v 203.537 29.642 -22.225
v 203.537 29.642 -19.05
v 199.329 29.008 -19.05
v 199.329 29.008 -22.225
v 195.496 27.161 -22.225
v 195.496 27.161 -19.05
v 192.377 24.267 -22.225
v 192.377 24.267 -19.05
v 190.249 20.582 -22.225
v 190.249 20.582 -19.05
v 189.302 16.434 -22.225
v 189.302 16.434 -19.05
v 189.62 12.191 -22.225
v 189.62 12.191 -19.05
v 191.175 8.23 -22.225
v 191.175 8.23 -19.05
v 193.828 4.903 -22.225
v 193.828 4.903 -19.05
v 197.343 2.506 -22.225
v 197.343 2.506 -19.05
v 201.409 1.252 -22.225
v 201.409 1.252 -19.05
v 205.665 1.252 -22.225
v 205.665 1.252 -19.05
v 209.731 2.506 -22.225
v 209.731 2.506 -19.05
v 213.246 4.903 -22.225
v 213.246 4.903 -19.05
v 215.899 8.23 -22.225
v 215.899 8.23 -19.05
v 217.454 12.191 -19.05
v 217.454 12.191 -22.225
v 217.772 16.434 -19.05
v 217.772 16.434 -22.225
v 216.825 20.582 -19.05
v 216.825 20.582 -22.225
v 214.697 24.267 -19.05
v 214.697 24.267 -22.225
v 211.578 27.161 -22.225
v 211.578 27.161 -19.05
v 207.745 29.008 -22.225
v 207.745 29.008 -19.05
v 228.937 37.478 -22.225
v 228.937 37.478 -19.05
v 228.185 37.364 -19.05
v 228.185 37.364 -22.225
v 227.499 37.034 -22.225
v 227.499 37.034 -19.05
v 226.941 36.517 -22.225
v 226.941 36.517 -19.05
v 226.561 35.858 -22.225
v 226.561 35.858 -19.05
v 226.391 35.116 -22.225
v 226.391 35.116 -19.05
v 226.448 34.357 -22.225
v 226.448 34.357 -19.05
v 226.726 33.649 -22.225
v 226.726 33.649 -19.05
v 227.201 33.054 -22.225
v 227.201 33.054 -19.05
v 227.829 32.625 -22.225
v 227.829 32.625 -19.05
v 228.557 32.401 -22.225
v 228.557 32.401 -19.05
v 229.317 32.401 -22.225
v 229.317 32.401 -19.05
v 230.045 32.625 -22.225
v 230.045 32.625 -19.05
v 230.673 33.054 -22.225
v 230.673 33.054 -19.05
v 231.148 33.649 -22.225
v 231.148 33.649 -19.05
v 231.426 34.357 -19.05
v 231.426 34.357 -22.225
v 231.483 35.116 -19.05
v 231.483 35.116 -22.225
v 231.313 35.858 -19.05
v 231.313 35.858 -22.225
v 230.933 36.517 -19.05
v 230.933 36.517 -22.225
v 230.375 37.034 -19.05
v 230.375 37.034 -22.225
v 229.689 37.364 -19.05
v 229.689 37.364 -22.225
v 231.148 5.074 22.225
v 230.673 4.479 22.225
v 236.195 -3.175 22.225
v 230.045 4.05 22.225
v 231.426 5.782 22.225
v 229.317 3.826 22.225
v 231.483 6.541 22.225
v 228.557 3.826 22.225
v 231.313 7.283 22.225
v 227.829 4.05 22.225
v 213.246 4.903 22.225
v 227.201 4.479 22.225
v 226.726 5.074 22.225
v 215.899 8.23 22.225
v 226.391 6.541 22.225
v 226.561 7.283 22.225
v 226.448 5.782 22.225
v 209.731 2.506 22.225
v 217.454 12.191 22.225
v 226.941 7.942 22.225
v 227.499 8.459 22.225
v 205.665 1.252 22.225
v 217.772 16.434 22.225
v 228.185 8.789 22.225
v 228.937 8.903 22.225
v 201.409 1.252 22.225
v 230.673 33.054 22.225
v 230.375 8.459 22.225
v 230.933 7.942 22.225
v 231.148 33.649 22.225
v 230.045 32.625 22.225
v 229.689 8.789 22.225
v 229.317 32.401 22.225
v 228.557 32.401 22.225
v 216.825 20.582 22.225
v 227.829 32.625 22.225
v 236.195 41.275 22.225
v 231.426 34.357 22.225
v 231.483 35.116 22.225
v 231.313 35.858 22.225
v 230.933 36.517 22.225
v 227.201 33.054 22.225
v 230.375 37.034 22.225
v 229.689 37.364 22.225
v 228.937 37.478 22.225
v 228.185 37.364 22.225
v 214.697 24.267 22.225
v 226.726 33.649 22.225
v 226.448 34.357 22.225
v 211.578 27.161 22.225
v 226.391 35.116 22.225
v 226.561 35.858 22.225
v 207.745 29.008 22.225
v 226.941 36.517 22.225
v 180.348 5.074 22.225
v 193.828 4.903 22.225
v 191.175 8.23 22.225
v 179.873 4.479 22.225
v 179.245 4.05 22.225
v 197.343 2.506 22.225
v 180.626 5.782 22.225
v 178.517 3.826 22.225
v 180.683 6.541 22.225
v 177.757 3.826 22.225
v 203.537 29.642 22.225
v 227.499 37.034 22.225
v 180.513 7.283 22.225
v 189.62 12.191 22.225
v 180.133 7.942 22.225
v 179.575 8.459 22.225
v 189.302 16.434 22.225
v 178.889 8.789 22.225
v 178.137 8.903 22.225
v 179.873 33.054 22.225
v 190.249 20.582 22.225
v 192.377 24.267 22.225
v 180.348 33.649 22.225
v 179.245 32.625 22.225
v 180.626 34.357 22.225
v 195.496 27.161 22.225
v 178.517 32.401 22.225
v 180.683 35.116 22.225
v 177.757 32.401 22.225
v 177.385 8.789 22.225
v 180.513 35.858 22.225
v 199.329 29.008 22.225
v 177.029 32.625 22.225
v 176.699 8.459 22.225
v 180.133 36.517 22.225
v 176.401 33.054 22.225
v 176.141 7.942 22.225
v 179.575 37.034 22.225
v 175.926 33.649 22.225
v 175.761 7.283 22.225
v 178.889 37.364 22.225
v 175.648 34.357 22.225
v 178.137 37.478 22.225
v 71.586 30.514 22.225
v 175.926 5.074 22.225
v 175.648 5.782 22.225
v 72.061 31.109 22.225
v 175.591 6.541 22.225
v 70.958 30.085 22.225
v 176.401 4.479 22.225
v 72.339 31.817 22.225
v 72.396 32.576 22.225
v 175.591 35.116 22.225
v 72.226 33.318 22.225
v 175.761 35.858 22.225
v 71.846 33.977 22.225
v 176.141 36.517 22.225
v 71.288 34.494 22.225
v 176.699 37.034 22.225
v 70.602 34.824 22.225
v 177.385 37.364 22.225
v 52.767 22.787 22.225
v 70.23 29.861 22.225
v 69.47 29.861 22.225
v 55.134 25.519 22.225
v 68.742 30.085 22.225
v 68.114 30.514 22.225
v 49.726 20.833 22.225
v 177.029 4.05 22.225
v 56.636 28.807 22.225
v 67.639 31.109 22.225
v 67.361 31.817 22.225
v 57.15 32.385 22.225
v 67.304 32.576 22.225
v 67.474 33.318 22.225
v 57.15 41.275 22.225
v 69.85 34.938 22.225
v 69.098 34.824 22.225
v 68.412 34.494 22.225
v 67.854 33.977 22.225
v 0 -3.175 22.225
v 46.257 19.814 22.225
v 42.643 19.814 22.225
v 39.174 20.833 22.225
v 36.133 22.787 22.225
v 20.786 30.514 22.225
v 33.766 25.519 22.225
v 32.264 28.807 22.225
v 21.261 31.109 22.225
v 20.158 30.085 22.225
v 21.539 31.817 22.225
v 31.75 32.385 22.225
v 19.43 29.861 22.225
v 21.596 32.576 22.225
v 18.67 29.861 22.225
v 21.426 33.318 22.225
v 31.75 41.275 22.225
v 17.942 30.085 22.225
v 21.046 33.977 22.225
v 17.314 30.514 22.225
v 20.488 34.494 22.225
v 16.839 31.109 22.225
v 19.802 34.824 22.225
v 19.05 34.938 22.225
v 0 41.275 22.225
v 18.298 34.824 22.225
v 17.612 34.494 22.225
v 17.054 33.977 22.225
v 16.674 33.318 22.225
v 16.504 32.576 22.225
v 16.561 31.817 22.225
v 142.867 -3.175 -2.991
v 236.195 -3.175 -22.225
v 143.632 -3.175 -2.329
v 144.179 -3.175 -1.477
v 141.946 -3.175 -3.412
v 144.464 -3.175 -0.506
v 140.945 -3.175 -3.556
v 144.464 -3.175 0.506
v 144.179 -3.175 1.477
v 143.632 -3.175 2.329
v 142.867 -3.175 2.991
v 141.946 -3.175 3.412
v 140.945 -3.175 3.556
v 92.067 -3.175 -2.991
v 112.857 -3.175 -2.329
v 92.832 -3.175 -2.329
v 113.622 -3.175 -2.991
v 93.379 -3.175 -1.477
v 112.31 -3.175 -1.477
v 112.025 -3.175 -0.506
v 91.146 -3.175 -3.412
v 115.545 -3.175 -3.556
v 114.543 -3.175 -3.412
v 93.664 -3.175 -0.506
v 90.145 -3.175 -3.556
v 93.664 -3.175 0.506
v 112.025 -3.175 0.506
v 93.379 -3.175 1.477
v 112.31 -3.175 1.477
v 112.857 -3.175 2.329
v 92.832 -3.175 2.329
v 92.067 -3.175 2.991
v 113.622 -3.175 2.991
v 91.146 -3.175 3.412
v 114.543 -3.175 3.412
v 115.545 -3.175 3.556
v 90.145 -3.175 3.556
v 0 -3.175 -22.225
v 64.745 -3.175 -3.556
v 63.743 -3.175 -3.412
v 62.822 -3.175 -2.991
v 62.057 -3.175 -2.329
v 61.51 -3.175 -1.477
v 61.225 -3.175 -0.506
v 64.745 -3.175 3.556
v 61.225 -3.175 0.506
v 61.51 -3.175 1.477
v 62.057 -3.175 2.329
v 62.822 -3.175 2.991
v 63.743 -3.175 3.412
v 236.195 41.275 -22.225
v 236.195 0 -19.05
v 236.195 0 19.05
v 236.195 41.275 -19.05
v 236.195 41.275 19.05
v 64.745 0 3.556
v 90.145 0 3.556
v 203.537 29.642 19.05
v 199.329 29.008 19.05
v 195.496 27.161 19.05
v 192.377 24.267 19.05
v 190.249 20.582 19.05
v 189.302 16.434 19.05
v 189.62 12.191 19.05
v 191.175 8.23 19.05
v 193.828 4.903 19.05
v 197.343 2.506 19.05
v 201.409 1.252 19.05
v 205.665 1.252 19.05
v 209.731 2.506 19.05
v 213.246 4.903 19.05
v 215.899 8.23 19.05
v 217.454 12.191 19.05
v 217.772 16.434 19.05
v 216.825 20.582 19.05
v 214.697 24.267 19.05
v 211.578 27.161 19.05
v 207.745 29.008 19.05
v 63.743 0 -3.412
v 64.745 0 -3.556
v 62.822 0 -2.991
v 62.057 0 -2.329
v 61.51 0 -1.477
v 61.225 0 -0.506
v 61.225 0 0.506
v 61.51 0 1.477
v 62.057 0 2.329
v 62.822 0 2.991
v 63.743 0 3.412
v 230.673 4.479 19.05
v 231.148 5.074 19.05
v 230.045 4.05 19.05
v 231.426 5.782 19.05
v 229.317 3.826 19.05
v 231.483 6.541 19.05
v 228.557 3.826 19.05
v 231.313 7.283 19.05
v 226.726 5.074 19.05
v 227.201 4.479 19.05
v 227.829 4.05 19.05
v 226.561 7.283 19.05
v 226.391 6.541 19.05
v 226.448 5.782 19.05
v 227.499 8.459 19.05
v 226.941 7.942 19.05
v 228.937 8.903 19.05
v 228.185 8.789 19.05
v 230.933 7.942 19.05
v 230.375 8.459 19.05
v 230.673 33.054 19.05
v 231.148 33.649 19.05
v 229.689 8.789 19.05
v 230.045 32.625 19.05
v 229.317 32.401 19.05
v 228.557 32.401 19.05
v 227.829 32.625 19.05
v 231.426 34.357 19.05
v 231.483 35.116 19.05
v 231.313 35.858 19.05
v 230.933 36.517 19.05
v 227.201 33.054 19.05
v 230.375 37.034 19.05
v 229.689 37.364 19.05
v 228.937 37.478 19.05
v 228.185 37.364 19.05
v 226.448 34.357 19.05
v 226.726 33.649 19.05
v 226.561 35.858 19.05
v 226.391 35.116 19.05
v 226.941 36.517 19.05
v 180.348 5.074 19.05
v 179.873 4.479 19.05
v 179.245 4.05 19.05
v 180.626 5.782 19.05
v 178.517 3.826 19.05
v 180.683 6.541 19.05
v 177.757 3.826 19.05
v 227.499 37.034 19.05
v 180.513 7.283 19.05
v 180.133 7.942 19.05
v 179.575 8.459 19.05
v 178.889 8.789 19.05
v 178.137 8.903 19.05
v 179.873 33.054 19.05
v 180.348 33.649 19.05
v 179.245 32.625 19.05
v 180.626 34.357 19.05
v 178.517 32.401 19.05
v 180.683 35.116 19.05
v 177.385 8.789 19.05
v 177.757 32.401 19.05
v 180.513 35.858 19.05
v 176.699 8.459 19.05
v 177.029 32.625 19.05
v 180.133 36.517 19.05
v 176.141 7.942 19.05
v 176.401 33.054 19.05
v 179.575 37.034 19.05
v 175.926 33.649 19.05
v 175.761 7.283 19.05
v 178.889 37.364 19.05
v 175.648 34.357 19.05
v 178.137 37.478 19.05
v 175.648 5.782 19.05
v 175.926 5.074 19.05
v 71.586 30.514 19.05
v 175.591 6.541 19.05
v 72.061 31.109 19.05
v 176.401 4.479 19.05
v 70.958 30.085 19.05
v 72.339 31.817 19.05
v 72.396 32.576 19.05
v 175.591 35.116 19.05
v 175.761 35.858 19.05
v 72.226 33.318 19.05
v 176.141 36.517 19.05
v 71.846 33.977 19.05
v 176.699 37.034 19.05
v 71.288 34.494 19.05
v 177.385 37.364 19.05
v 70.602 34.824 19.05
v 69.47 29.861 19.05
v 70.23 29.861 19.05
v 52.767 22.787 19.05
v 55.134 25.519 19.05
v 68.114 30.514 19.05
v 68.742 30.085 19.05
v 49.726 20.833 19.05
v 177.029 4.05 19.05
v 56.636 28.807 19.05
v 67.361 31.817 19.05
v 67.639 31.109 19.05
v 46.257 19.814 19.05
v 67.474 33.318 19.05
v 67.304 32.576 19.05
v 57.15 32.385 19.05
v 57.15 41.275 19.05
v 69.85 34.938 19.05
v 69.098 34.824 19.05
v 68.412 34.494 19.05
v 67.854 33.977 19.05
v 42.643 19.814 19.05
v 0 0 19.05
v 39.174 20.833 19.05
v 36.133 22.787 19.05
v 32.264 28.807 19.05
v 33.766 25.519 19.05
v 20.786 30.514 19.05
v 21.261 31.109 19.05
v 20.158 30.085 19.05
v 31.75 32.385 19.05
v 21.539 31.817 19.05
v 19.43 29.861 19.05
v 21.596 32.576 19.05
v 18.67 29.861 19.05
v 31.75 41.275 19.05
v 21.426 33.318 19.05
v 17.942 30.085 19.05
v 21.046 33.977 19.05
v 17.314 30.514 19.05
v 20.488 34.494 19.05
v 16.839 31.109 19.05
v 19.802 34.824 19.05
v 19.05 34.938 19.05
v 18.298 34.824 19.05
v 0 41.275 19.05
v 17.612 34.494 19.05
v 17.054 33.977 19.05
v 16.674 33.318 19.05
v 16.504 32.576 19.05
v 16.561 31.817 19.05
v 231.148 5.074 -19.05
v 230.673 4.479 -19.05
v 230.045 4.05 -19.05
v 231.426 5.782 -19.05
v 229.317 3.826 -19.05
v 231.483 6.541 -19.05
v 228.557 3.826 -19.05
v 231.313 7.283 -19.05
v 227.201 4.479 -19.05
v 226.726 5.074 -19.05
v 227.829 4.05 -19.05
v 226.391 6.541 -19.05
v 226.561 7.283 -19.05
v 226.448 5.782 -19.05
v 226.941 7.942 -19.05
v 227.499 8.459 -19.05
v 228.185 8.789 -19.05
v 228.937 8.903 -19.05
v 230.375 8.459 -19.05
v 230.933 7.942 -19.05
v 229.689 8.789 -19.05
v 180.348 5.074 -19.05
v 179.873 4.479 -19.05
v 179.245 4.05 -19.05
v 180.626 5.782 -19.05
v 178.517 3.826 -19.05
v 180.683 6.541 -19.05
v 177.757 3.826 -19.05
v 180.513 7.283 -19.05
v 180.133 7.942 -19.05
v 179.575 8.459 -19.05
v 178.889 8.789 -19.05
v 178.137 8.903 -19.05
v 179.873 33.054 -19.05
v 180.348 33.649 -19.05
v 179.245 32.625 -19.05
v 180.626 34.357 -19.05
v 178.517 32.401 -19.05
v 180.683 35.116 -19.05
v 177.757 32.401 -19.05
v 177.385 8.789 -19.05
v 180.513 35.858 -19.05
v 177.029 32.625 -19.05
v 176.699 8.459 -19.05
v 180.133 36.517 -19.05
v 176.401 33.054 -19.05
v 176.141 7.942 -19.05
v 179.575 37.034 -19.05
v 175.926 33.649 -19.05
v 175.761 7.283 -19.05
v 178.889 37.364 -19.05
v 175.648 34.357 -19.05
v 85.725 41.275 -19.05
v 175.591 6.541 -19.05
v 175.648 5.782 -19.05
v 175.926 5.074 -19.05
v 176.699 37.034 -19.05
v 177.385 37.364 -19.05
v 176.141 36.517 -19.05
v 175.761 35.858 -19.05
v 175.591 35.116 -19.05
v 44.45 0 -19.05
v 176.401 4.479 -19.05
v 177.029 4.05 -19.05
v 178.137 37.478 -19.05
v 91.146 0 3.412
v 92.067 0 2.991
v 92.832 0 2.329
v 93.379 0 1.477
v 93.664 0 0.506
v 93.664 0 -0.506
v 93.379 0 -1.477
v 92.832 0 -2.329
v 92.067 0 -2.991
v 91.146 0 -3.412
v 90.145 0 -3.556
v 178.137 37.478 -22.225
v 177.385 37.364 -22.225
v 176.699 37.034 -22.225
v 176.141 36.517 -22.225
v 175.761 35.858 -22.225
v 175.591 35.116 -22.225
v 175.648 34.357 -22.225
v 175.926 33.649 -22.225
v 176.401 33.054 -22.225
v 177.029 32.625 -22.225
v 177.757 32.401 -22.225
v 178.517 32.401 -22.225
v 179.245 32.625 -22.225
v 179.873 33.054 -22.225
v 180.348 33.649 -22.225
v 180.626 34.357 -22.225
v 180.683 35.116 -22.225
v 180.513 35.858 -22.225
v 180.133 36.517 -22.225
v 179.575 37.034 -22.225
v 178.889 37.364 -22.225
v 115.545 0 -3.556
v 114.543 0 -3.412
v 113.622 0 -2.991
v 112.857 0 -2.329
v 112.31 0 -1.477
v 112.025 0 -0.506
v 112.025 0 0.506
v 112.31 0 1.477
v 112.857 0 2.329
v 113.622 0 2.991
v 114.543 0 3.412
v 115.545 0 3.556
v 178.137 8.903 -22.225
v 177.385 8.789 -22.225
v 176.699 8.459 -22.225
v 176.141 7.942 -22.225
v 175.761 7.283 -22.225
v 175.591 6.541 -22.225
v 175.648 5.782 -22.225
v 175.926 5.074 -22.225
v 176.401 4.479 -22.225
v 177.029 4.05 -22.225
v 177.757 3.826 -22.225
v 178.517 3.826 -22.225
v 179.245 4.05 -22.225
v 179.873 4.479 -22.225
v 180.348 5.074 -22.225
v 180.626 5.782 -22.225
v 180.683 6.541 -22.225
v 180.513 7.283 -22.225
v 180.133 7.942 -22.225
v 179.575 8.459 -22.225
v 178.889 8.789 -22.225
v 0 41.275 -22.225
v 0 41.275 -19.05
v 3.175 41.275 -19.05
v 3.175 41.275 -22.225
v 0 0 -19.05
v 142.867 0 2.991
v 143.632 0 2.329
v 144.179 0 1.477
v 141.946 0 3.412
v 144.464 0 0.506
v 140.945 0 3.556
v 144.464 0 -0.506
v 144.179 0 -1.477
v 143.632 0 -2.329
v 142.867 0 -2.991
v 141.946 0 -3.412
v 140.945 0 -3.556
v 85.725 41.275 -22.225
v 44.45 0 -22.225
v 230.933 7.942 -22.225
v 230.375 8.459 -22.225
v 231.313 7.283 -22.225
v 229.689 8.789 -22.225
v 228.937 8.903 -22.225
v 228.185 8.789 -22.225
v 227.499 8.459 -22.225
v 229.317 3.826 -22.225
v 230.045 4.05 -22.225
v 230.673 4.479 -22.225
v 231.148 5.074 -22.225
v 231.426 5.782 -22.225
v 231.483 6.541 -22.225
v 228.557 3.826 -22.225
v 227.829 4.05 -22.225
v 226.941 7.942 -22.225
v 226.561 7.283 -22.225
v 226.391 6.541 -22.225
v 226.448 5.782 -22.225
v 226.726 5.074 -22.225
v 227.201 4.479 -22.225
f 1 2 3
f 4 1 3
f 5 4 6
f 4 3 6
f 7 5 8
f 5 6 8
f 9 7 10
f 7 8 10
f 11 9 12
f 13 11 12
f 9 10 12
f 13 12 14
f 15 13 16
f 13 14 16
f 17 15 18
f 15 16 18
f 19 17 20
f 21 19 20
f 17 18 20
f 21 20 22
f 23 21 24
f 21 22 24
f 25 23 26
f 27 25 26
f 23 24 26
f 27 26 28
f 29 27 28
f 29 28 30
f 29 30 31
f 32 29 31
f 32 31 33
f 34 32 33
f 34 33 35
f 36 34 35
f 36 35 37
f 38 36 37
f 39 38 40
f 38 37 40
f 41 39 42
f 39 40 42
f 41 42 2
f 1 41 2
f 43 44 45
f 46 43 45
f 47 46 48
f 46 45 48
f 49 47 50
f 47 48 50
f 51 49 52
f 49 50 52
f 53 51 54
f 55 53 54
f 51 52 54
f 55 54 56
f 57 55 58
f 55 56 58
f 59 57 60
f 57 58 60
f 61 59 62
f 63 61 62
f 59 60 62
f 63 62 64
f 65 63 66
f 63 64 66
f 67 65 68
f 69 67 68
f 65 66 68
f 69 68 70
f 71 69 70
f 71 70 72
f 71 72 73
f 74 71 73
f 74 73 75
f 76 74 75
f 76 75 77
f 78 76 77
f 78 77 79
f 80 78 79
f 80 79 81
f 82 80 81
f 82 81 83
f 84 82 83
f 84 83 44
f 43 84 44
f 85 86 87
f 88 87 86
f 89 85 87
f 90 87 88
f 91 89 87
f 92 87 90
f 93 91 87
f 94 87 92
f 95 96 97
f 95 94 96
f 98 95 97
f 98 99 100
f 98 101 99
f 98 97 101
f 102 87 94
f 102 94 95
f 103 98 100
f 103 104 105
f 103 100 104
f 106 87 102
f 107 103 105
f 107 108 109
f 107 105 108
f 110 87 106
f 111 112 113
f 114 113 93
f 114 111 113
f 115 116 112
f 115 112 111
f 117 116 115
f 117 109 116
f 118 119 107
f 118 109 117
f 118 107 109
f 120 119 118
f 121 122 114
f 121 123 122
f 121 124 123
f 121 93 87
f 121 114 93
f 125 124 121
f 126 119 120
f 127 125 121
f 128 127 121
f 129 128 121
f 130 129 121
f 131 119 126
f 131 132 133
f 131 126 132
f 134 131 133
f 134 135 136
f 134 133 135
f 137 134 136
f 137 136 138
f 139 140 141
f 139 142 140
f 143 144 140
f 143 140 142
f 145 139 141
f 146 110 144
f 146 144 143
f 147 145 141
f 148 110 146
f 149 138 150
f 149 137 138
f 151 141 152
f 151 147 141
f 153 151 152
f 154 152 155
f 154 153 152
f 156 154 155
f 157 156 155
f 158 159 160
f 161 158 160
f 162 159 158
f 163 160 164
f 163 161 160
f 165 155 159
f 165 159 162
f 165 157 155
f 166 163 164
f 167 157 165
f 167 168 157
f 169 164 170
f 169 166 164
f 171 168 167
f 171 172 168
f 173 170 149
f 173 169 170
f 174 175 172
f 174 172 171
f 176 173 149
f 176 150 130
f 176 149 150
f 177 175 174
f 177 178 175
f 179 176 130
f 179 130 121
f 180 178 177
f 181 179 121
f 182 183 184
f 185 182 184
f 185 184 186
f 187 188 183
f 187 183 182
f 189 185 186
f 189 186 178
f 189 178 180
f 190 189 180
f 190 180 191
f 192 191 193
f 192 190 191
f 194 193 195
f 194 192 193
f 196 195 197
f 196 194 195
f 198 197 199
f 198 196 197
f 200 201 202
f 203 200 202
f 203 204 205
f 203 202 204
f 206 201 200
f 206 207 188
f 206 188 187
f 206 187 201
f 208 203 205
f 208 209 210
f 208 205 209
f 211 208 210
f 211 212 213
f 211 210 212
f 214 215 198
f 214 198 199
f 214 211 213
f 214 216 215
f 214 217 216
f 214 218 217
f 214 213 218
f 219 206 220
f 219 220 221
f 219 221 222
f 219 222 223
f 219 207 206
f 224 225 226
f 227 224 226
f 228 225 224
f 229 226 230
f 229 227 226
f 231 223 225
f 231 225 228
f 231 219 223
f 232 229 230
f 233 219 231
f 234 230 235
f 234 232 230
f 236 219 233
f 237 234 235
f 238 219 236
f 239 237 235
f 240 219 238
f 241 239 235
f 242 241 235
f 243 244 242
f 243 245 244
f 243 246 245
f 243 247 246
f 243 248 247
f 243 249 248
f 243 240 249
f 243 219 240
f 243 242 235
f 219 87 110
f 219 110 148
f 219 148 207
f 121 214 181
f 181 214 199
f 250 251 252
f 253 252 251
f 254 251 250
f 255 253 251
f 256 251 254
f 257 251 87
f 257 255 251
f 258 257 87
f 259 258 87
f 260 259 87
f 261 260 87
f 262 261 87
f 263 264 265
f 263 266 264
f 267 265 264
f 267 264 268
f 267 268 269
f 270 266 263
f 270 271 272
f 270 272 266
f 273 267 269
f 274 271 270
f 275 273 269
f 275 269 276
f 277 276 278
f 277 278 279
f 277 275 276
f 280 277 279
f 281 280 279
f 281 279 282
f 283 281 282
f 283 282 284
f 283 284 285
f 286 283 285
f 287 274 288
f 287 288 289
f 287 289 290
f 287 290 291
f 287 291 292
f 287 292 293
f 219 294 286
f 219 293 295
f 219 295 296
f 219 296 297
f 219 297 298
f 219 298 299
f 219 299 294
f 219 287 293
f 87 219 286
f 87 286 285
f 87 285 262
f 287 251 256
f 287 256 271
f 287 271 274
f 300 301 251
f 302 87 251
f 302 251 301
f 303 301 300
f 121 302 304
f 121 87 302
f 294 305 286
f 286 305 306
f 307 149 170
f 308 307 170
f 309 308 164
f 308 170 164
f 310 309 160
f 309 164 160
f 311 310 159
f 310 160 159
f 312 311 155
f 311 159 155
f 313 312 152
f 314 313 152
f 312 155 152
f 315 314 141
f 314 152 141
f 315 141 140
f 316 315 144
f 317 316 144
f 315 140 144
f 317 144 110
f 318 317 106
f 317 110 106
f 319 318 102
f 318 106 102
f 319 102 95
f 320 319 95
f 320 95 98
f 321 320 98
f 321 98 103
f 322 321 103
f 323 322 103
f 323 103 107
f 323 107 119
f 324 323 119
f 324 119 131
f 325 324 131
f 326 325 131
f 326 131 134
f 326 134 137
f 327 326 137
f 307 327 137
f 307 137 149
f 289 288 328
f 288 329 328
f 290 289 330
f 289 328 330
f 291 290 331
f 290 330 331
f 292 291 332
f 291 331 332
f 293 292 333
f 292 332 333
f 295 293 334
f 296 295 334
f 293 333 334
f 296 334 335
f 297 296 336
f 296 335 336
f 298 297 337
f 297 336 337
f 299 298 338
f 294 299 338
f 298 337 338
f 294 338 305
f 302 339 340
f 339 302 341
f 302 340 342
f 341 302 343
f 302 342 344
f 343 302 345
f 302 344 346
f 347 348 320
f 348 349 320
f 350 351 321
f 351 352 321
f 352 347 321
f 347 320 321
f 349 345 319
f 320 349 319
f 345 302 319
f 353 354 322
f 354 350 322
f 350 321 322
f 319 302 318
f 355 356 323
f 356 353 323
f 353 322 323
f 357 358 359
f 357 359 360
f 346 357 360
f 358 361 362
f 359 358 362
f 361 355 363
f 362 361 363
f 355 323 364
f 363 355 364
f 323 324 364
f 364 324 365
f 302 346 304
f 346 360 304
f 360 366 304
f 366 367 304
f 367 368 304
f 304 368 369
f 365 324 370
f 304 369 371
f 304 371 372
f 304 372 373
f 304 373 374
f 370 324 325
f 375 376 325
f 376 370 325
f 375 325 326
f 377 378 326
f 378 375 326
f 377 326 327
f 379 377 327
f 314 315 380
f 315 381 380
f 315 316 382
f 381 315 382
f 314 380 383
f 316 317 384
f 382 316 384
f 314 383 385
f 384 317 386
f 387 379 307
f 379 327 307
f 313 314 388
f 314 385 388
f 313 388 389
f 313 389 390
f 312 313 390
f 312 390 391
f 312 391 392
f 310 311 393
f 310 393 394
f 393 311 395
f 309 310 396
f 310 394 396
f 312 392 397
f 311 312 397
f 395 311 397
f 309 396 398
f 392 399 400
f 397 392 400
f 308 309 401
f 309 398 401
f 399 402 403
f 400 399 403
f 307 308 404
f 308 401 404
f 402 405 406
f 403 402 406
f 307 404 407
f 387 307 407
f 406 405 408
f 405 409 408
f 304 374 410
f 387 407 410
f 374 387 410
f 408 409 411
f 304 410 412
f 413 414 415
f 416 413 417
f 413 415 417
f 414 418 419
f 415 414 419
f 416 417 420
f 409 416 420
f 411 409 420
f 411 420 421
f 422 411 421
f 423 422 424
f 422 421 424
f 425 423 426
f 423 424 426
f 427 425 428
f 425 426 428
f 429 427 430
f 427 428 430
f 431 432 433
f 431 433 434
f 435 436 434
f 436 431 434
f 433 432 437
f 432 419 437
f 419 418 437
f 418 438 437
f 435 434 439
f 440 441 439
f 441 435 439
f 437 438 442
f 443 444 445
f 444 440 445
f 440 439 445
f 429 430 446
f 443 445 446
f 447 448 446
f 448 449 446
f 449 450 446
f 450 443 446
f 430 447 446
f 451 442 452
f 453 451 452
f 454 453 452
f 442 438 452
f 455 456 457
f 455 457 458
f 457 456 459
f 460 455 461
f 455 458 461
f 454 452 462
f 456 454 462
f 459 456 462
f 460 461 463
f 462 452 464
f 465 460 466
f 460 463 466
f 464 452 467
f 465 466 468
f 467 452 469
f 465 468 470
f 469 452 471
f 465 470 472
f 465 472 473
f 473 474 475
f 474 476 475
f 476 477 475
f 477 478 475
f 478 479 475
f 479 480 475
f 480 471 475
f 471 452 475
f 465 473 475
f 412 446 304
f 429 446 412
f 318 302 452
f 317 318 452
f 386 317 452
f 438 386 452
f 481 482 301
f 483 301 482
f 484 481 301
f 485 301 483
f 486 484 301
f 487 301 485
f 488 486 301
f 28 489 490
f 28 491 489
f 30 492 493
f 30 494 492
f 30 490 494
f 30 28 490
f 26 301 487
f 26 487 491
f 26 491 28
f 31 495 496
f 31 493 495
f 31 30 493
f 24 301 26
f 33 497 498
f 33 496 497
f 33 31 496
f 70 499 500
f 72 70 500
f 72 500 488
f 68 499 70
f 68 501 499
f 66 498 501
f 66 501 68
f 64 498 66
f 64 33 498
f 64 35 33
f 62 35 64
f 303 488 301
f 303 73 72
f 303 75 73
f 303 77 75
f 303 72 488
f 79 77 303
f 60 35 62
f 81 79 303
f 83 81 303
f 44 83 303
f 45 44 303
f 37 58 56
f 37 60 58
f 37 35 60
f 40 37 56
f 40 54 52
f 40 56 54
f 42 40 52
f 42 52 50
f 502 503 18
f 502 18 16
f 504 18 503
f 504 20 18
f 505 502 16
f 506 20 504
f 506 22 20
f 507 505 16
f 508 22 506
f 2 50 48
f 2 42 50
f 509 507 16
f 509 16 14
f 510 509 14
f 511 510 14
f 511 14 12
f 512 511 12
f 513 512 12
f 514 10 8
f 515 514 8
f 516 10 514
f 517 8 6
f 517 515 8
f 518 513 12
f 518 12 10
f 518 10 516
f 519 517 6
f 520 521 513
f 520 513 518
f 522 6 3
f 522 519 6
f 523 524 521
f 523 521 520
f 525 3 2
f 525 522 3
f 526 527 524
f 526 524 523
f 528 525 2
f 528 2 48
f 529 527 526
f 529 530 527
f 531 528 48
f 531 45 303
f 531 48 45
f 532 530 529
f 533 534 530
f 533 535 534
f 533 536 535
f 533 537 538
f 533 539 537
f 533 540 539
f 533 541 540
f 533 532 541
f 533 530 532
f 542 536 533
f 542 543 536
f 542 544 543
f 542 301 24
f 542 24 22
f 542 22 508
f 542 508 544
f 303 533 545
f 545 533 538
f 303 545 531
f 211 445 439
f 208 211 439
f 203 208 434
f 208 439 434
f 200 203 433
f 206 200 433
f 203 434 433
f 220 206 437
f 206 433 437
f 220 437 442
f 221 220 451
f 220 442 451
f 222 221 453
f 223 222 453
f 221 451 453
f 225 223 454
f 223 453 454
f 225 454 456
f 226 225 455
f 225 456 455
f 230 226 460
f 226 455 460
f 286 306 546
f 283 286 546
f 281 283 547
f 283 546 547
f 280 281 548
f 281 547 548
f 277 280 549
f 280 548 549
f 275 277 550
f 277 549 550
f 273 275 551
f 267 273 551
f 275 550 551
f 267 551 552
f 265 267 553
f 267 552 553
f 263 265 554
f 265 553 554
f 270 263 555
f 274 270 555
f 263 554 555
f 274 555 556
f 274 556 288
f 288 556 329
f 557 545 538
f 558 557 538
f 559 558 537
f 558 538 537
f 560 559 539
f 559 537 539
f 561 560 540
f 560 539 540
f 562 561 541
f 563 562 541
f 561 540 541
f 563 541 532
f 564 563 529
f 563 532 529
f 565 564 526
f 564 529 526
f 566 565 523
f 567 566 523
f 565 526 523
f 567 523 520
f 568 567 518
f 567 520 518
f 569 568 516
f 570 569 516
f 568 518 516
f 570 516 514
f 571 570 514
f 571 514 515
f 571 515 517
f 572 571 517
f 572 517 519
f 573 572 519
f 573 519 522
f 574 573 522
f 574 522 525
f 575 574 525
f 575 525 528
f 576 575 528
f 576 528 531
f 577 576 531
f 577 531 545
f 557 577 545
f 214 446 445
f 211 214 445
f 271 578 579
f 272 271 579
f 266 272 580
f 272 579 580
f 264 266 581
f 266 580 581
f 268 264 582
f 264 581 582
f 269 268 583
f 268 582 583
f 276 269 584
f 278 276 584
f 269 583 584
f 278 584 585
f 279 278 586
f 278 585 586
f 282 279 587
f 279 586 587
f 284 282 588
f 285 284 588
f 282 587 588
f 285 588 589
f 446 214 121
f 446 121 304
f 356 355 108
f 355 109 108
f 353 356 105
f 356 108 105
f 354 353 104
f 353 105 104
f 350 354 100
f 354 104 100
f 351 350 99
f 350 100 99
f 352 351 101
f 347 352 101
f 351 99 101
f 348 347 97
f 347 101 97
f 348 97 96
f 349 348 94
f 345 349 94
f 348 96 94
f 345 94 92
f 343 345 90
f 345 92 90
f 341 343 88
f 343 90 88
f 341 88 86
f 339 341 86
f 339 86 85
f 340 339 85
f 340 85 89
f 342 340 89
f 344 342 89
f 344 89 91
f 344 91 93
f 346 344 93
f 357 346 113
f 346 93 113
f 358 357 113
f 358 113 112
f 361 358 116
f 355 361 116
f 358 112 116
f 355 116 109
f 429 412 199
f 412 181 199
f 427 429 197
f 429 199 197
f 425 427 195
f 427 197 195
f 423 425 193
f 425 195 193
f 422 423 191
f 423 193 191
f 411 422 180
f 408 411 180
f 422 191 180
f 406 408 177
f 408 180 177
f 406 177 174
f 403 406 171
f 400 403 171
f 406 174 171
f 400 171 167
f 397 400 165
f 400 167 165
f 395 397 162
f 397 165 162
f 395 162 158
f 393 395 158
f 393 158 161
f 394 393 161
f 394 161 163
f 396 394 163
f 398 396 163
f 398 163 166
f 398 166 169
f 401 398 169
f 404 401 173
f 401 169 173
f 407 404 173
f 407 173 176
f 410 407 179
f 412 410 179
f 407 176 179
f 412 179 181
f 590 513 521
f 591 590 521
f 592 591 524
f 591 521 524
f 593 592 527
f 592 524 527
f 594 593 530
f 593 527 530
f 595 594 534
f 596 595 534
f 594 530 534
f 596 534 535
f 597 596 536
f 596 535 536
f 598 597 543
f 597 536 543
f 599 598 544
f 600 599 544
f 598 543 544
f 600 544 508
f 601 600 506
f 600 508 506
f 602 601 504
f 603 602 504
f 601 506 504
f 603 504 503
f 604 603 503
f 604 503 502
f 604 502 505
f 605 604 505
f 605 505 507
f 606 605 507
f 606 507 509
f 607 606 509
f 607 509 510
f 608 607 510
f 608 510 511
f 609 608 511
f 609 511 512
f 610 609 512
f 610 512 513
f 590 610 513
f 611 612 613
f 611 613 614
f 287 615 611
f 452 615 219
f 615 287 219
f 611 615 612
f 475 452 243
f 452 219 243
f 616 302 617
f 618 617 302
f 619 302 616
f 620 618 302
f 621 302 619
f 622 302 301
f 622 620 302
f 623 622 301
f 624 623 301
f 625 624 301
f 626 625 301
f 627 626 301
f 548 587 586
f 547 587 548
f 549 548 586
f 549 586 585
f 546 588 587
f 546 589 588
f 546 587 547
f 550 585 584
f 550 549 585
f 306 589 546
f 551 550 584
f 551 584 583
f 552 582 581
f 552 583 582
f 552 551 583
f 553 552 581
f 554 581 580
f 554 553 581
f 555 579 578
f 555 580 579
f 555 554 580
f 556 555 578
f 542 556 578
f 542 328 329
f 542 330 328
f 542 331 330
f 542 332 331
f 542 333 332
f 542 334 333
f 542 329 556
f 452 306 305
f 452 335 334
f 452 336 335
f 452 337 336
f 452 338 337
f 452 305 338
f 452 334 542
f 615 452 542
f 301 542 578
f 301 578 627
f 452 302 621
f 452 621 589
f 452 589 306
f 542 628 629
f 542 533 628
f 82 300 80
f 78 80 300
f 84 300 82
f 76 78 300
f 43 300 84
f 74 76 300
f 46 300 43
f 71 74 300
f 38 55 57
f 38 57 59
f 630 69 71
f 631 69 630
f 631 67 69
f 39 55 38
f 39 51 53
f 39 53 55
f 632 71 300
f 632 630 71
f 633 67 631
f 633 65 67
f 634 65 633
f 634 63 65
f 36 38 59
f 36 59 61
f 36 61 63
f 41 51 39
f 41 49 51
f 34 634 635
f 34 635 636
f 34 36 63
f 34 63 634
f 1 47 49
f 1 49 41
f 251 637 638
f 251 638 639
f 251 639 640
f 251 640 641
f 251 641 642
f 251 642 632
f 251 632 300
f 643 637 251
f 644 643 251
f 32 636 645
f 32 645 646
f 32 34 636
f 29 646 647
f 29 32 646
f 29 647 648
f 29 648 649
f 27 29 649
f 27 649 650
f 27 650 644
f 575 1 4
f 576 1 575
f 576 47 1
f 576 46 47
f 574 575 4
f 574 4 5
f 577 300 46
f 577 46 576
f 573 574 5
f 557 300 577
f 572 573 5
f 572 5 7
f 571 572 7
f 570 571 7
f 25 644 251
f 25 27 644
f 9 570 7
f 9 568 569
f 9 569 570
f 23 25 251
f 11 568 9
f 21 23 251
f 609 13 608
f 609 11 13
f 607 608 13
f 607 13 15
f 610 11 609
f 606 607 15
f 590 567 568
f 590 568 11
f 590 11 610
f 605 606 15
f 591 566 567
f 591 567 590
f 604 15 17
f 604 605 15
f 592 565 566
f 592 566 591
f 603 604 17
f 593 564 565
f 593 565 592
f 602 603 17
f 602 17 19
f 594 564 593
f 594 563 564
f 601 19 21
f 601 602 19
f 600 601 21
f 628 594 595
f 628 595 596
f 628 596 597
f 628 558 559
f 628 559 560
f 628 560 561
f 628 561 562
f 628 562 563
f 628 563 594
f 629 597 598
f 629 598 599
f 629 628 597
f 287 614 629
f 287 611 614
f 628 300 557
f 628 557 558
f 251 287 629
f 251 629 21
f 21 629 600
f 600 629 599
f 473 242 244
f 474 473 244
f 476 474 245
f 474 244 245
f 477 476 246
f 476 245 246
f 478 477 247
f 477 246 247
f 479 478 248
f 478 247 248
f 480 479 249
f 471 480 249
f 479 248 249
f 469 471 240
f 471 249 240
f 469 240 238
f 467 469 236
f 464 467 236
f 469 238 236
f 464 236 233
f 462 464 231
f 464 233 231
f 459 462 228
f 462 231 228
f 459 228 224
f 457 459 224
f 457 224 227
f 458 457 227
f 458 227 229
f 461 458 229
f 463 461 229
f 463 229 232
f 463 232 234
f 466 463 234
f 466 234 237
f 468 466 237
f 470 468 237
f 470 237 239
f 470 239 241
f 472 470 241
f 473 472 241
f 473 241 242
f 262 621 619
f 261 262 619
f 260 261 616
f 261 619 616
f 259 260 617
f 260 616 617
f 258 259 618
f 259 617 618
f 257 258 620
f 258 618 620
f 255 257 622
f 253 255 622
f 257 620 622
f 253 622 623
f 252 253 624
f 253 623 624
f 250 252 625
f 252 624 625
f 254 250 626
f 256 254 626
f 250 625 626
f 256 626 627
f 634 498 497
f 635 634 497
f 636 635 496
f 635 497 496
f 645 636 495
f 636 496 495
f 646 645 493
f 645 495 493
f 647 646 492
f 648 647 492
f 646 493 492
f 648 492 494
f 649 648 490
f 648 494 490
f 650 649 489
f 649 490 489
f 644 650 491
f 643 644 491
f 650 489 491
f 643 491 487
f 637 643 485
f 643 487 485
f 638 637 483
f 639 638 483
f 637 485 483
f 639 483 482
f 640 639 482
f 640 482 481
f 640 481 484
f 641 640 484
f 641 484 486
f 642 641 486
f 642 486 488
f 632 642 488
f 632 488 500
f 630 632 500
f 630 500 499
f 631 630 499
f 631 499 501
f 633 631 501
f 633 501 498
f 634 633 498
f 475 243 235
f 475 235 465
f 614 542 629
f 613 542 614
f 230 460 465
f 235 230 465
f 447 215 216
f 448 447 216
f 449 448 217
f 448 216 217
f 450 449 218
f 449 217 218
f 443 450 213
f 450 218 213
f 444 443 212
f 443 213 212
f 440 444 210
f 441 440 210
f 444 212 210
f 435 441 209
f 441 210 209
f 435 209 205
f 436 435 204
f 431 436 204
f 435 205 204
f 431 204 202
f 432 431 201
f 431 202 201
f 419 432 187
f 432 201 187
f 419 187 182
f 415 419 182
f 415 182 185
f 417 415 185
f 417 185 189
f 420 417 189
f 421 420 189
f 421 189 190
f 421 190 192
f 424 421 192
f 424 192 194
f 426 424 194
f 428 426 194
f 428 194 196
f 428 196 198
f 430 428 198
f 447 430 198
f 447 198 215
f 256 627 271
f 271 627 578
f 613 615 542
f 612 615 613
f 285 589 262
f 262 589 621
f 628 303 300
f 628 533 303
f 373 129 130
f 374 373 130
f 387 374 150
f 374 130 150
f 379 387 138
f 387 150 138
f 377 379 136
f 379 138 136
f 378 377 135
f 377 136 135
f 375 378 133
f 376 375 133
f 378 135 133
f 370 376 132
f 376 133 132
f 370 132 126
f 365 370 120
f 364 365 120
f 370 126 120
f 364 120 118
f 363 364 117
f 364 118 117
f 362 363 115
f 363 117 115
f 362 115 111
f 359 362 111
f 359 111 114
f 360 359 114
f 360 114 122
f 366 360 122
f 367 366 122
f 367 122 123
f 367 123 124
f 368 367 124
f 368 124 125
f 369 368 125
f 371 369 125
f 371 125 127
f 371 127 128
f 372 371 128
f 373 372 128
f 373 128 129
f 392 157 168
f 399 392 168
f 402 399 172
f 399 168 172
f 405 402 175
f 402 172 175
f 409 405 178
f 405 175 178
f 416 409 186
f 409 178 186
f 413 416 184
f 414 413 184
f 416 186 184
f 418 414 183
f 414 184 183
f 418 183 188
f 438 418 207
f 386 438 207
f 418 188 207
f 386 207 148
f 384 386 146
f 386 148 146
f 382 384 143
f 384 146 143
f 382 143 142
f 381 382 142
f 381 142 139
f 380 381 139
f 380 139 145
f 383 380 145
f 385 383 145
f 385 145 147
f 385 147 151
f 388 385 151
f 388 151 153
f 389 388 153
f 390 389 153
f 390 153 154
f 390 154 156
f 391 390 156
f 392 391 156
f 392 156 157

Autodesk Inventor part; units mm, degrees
ref_plane "YZ Plane" through (0, 0, 0) normal (1, 0, 0) x (0, 1, 0)
ref_plane "XZ Plane" through (0, 0, 0) normal (0, 1, 0) x (-1, 0, 0)
ref_plane "XY Plane" through (0, 0, 0) normal (0, 0, 1) x (1, 0, 0)
sketch "Sketch1" plane through (0, 0, 0) normal (1, 0, 0) x (0, 1, 0)
  line L0 (41.275, -22.225) -> (-3.175, -22.225)
  line L1 (-3.175, -22.225) -> (-3.175, 22.225)
  line L2 (-3.175, 22.225) -> (41.275, 22.225)
  line L3 (0, 19.05) -> (0, -19.05)
  line L4 (0, 19.05) -> (41.275, 19.05)
  line L5 (0, -19.05) -> (41.275, -19.05)
  line L6 (41.275, 22.225) -> (41.275, 19.05)
  line L7 (41.275, -19.05) -> (41.275, -22.225)
  point P0 (0, 0)
  point P1 (0, 0)
  dimension "d27" = 44.45
  dimension "d28" = 44.45
  dimension "d29" = 3.175
  dimension "d83" = 3.175
extrude "Extrusion1" add sketch "Sketch1" along normal blind 236.1946
sketch "Sketch4" plane through (0, -3.175, -22.225) normal (0, 0, -1) x (-1, 0, 0)
  line L0 (0, 3.175) -> (0, 0) projected
  line L1 (-44.45, 101.8817) -> (-44.45, -23.3371)
  line L2 (0, 3.175) -> (-236.1946, 3.175) projected
  point P0 (-19.05, 35.56)
  point P1 (-69.85, 35.56)
  dimension "d30" = 50.8
  dimension "d81" = 25.4
  dimension "d82" = 44.45
  dimension "d84" = 32.385
hole "Hole2" at (19.05, 32.385, -22.225) at (69.85, 32.385, -22.225) direction (0, 0, 1) diameter 5.1054 end through all clearance for "Flat Head Machine Screw (82)" size "#10" standard "Ansi Unified Screw Threads"
sketch "Sketch7" plane through (0, -3.175, 0) normal (0, 0, 1) x (1, 0, 0)
  line L0 (-1.0792, 48.7042) -> (44.45, 94.2334)
  line L1 (44.45, 94.2334) -> (89.9792, 48.7042)
  line L2 (89.9792, 48.7042) -> (44.45, 3.175)
  line L3 (44.45, 3.175) -> (-1.0792, 48.7042)
  line L4 (0, 0) -> (0, 44.45) projected
  line L5 (0, 0) -> (236.1946, 0) projected
  line L6 (44.45, 3.175) -> (44.45, -64.4339)
  circle A0 centre (19.05, 35.56) radius 2.5527 projected
  circle A1 centre (69.85, 35.56) radius 2.5527 projected
  point P0 (0, 3.175)
  dimension "d57" = 3.175
  dimension "d85" = 50.8
  dimension "d86" = 25.4
  dimension "d87" = 135
extrude "Extrusion3" cut sketch "Sketch7" against normal through all contours L0 L1 L2 L3 | A0 | A1
sketch "Sketch10" plane through (0, -3.175, 0) normal (0, 0, 1) x (1, 0, 0)
  line L0 (31.75, 54.9704) -> (57.15, 54.9704)
  line L1 (57.15, 54.9704) -> (57.15, 35.56)
  line L2 (31.75, 35.56) -> (31.75, 54.9704)
  arc A0 (31.75, 35.56) -> (57.15, 35.56) centre (44.45, 35.56) ccw
  circle A1 centre (19.05, 35.56) radius 2.5527 projected
  point P0 (0, 3.175)
  point P1 (44.45, 3.175)
  dimension "d88" = 25.4
extrude "Extrusion5" cut sketch "Sketch10" along normal through all contours L0 L1 A0 L2
sketch "Sketch11" plane through (0, -3.175, -22.225) normal (0, 0, -1) x (-1, 0, 0)
  line L0 (-236.1946, 0) -> (-236.1946, 44.45) projected
  line L1 (0, 0) -> (-236.1946, 0) projected
  arc A0 (-57.15, 35.56) -> (-31.75, 35.56) centre (-44.45, 35.56) ccw projected
  line L2 (-85.725, 44.45) -> (-236.1946, 44.45) projected
  point P0 (0, 3.175)
  point P1 (-203.537, 18.542)
  point P2 (-236.1946, 22.225)
  dimension "d89" = 159.9946
  dimension "d114" = 25.908
hole "Hole5" at (203.537, 15.367, -22.225) direction (0, 0, 1) diameter 28.5496 end through all
sketch "Sketch12" plane through (0, -3.175, -22.225) normal (0, 0, -1) x (-1, 0, 0)
  circle A0 centre (-203.537, 18.542) radius 14.2748 projected
  line L0 (0, 0) -> (-236.1946, 0) projected
  point P0 (0, 3.175)
  point P1 (-178.137, 38.1)
  point P2 (-178.137, 9.525)
  point P3 (-228.937, 9.525)
  point P4 (-228.937, 38.1)
  dimension "d99" = 9.525
  dimension "d100" = 38.1
  dimension "d101" = 25.4
  dimension "d102" = 25.4
hole "Hole6" at (178.137, 34.925, -22.225) at (178.137, 6.35, -22.225) at (228.937, 6.35, -22.225) at (228.937, 34.925, -22.225) direction (0, 0, 1) diameter 5.1054 end through all clearance for "Flat Head Machine Screw (82)" size "#10" standard "Ansi Unified Screw Threads"
sketch "Sketch8" plane through (0, 0, 19.05) normal (0, 1, 0) x (1, 0, 0)
  line L0 (64.7446, 19.05) -> (90.1446, 19.05) construction
  line L1 (64.7446, 15.494) -> (90.1446, 15.494)
  line L2 (90.1446, 22.606) -> (64.7446, 22.606)
  arc A0 (64.7446, 22.606) -> (64.7446, 15.494) centre (64.7446, 19.05) ccw
  arc A1 (90.1446, 15.494) -> (90.1446, 22.606) centre (90.1446, 19.05) ccw
  line L3 (115.5446, 19.05) -> (140.9446, 19.05) construction
  line L4 (115.5446, 15.494) -> (140.9446, 15.494)
  line L5 (140.9446, 22.606) -> (115.5446, 22.606)
  arc A2 (115.5446, 22.606) -> (115.5446, 15.494) centre (115.5446, 19.05) ccw
  arc A3 (140.9446, 15.494) -> (140.9446, 22.606) centre (140.9446, 19.05) ccw
  line L6 (236.1946, 38.1) -> (236.1946, 0) projected
  line L7 (0, 0) -> (0, 38.1) projected
  point P0 (77.4446, 19.05)
  point P1 (128.2446, 19.05)
  point P2 (0, 19.05)
  dimension "d62" = 25.4
  dimension "d64" = 107.95
  dimension "d80" = 158.75
  dimension "d115" = 7.112
extrude "Extrusion4" cut sketch "Sketch8" against normal through all
ref_plane "Work Plane1" through (0, -3.175, 0) normal (0, 0, 1) x (1, 0, 0)
sketch "Sketch2" plane through (0, 0, 0) normal (0, 0, 1) x (1, 0, 0)
  circle A0 centre (23.8125, 23.8125) radius 25.4
  line L0 (5.852, 64.6197) -> (5.852, -28.4292) construction
  line L1 (0, 50.8) -> (0, 0) construction
  line L2 (0, 0) -> (304.8, 0) construction
  line L3 (304.8, 50.8) -> (304.8, 0) construction
  line L4 (0, 50.8) -> (304.8, 50.8) construction
  line L5 (0, 47.625) -> (304.8, 47.625) construction
  point P0 (5.852, 5.852)
  point P1 (41.773, 5.852)
  point P2 (41.773, 41.773)
  point P3 (5.852, 41.773)
  dimension "d11" = 50.8
  dimension "d14" = 360
  dimension "d16" = 5.852
  dimension "d17" = 5.852
  dimension "d19" = 5.852
equation "\"d83\" = d29"
equation "\"d81\" = 0.5 * d30"
equation "\"d86\" = 0.5 * d85"
equation "\"d16\" = d17"
equation "\"d19\" = d17"
properties part number "CAR_042_KickerLBracket" material "Aluminum 6061"
